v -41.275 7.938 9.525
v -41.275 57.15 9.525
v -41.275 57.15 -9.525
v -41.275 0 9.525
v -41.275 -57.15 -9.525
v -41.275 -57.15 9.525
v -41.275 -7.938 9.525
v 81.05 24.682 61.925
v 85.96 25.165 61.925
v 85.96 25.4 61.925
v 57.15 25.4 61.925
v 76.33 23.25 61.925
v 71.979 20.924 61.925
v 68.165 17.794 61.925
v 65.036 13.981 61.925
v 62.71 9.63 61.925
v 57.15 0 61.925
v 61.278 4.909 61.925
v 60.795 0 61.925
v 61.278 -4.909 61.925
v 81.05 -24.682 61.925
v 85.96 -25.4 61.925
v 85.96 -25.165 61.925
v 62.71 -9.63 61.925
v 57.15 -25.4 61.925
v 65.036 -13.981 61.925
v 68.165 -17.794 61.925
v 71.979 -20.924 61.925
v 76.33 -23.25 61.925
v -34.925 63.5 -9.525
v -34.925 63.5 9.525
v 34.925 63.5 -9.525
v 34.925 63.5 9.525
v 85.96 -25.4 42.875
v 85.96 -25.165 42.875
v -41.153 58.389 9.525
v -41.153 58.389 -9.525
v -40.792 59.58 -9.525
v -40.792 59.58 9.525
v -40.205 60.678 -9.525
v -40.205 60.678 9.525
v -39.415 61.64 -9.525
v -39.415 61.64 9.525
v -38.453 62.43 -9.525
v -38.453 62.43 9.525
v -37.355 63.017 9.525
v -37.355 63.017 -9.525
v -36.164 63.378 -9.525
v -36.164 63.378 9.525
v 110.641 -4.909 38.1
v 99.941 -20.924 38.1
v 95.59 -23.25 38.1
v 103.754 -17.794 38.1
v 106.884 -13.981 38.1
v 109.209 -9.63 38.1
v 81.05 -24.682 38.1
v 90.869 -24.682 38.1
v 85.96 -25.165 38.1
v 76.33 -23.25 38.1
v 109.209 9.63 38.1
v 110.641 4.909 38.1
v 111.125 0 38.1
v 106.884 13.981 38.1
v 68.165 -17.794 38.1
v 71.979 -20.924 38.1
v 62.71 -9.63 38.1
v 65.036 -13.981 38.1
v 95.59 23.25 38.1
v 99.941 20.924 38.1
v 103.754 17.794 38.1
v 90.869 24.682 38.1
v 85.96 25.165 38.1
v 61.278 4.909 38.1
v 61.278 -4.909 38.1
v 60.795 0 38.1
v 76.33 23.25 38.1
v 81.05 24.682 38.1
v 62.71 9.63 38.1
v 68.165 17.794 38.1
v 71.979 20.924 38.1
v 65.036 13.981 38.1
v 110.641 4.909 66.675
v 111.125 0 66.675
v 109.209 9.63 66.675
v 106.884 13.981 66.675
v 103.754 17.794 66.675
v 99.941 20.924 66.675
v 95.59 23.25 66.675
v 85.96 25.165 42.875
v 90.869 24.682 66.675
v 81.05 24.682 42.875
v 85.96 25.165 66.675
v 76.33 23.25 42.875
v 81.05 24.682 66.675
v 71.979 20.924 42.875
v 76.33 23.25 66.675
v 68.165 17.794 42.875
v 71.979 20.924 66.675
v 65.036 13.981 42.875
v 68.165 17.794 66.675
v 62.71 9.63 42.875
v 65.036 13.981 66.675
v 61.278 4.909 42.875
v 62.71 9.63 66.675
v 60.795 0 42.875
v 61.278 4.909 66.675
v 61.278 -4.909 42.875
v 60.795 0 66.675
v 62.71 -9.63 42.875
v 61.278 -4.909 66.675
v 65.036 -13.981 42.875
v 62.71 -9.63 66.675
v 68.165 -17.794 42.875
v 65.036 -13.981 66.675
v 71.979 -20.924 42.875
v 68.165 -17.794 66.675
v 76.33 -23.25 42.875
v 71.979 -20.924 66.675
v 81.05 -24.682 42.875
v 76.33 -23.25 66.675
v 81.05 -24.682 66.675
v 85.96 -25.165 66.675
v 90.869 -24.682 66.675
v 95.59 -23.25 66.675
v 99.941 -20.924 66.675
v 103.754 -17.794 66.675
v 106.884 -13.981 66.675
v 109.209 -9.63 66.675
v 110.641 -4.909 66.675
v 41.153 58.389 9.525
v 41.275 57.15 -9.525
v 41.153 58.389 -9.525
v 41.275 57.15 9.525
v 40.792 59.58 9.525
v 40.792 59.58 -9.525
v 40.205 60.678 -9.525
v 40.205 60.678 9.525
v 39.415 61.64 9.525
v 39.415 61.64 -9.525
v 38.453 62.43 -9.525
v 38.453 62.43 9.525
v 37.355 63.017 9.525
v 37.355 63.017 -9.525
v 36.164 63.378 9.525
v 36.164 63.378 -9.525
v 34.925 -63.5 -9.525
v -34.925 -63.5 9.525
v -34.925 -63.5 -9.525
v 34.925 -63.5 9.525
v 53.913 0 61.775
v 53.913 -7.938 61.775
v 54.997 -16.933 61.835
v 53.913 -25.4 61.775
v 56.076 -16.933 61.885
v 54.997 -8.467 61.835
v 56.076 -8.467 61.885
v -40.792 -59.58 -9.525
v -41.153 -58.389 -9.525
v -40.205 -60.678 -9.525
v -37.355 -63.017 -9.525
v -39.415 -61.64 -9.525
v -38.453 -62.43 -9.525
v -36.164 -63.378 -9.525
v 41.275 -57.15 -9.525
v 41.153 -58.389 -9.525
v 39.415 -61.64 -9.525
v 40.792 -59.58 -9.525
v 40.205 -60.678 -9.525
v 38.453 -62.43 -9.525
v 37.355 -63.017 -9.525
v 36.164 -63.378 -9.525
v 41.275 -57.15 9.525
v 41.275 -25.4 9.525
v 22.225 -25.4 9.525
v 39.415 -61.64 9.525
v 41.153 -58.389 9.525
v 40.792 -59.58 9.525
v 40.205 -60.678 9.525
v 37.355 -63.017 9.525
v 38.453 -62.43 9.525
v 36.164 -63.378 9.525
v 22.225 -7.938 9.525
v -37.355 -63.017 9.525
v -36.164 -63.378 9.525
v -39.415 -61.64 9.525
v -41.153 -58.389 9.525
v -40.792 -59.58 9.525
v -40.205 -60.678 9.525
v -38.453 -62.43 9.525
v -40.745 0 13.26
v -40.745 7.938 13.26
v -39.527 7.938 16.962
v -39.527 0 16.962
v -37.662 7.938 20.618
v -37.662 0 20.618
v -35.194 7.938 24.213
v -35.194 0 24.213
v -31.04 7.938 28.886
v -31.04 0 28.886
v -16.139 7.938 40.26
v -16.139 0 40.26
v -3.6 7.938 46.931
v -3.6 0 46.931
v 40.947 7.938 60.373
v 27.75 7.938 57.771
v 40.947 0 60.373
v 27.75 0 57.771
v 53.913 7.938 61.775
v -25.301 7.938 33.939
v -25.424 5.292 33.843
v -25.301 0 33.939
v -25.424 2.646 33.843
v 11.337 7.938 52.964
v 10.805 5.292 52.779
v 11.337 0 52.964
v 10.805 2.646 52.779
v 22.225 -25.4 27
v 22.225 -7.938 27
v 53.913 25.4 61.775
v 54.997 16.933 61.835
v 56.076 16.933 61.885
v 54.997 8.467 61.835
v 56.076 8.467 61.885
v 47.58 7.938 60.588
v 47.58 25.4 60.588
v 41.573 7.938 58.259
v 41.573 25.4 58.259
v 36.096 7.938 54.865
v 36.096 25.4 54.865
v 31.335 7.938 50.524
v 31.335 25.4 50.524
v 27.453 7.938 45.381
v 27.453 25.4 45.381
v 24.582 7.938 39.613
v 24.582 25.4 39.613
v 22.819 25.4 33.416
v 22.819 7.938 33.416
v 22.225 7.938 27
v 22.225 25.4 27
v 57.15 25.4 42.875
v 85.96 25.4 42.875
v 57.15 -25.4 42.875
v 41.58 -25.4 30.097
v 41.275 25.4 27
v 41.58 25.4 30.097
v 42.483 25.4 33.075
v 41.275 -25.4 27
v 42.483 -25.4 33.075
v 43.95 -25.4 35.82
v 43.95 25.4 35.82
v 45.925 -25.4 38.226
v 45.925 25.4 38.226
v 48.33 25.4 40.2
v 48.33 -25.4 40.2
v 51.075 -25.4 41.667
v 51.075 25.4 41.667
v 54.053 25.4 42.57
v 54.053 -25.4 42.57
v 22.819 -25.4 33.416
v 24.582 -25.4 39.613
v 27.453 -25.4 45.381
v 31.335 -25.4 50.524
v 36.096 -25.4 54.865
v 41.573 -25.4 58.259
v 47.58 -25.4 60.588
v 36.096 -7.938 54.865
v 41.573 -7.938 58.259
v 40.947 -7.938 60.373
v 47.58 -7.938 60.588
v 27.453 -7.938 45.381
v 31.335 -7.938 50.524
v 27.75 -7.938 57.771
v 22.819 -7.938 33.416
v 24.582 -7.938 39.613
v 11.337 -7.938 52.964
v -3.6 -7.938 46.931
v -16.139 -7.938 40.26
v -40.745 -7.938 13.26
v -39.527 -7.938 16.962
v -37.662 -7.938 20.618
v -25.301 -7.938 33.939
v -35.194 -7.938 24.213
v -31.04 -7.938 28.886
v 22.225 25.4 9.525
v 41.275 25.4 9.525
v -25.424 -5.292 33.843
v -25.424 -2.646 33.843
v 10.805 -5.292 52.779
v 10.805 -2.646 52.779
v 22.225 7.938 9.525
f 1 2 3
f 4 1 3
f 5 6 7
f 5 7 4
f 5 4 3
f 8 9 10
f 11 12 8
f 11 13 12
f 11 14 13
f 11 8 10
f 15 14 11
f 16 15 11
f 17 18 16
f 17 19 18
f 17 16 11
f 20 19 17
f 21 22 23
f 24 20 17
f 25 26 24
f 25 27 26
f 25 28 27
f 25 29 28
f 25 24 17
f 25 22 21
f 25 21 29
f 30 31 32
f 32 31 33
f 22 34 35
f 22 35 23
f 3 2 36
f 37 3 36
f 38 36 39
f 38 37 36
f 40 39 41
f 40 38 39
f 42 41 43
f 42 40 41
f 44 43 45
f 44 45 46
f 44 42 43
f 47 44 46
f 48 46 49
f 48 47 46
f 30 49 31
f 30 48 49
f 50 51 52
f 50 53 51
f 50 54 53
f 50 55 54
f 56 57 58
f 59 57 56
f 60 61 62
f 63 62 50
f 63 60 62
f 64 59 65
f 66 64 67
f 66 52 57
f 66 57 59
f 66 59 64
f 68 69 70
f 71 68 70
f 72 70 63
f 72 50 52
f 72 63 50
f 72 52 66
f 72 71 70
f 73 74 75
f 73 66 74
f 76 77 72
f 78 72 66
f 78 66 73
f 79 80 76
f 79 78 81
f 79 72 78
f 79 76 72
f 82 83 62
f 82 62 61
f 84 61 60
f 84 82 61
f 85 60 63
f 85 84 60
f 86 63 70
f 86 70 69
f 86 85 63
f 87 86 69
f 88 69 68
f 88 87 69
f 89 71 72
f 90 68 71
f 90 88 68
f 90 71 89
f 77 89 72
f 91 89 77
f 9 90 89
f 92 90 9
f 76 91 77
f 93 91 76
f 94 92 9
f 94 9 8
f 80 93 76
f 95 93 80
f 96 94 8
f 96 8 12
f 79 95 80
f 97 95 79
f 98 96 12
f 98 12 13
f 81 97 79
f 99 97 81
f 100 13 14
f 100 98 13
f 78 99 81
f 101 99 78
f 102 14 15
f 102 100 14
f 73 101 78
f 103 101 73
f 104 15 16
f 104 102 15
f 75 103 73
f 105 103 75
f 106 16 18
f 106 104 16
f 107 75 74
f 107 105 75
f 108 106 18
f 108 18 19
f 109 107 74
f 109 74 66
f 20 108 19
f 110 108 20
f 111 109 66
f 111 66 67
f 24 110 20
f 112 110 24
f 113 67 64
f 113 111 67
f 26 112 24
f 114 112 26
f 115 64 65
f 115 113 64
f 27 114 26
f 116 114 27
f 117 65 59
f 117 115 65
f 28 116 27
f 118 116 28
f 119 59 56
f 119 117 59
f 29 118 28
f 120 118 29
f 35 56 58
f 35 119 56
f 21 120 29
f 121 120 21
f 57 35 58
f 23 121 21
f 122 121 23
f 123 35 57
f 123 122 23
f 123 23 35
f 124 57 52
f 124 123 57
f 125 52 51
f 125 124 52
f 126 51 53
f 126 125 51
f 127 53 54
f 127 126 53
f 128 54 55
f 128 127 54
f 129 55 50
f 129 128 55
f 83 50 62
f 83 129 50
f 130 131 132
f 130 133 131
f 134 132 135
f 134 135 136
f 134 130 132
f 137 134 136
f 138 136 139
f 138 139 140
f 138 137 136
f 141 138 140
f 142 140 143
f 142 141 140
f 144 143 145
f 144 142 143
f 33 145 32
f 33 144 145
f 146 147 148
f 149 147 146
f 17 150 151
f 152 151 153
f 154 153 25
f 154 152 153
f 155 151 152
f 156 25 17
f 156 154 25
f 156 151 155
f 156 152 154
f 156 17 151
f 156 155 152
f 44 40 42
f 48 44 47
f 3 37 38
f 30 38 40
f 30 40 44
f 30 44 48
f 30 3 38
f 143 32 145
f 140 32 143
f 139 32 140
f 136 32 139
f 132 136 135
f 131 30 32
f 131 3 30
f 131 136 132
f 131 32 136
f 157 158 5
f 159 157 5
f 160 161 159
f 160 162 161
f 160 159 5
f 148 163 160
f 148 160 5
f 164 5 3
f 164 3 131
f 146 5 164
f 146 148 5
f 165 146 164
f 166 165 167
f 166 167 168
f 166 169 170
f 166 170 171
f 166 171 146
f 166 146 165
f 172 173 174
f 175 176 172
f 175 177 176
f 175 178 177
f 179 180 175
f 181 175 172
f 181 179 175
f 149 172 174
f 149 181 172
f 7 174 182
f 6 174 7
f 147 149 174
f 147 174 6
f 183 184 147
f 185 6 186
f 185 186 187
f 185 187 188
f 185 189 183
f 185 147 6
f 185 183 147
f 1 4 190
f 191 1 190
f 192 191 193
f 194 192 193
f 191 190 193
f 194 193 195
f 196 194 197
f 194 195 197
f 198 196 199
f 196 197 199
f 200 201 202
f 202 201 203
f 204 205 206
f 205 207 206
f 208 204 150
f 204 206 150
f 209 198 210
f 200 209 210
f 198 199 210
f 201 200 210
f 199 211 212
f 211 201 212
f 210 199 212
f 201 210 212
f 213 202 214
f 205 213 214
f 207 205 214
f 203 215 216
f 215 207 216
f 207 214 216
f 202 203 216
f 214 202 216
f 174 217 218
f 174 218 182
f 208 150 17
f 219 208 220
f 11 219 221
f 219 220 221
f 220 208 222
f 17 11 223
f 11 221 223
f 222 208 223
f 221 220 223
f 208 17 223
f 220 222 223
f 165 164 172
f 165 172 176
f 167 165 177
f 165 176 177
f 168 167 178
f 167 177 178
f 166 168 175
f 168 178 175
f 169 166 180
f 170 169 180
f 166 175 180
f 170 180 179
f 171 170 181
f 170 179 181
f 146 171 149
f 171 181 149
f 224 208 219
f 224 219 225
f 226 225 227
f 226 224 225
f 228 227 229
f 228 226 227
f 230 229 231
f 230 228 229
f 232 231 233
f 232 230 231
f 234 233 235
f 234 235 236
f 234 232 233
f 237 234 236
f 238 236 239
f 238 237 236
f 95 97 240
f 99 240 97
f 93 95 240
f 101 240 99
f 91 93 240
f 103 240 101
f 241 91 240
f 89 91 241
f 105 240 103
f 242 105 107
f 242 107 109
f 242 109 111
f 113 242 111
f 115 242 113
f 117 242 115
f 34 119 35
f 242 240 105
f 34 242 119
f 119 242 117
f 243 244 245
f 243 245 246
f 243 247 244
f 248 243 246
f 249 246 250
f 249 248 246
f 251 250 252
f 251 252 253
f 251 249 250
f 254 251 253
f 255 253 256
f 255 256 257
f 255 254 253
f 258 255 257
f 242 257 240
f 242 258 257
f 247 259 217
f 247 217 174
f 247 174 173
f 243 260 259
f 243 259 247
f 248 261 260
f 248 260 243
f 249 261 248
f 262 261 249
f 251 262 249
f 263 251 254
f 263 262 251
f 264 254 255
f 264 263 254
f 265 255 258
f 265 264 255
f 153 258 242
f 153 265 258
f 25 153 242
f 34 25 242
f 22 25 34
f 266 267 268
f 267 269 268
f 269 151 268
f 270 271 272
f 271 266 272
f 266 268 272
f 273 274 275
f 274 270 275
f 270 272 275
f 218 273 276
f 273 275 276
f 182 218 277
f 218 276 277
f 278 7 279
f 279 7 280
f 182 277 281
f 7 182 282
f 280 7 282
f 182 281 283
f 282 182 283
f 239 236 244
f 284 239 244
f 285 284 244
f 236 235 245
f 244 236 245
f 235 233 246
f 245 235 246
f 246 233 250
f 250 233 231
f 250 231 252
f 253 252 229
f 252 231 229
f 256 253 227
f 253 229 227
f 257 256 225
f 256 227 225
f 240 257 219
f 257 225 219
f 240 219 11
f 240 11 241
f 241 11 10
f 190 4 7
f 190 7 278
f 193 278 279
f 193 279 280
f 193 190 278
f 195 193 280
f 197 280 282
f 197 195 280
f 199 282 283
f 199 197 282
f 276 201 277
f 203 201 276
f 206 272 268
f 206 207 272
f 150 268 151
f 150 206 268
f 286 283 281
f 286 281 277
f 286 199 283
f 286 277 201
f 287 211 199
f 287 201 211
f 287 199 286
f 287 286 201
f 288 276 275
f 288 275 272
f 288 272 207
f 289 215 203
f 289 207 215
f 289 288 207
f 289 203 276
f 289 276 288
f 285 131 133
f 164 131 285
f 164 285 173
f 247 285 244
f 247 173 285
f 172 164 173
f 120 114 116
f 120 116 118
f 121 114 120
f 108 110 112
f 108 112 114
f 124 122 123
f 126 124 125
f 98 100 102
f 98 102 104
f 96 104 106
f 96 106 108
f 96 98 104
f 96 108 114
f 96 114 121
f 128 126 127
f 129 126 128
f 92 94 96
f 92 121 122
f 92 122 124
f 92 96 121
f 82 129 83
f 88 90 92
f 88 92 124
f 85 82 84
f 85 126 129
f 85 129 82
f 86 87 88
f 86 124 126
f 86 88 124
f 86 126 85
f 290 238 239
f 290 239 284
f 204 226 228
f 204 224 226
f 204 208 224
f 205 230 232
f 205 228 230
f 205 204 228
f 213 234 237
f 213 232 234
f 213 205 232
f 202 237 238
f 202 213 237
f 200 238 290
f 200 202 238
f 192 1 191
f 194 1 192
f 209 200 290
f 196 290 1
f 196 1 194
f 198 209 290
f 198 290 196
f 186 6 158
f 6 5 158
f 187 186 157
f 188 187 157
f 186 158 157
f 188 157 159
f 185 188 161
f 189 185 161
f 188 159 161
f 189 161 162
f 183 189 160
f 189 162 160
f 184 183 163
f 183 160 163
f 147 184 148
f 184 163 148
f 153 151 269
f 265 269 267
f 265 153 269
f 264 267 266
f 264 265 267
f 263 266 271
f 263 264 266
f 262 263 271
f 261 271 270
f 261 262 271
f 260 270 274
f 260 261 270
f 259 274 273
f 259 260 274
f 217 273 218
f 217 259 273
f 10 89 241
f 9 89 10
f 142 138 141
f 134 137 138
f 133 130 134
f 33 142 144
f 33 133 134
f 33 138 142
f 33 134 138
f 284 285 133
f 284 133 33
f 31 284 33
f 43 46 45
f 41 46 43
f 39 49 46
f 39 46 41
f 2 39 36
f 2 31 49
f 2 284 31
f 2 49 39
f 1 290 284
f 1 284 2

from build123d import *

# Parameters (mm, degrees)
F1_DEPTH = 63.5
F0_W     = 25.6348975327
F0_H     = 19.05
F2_DEPTH = 25.4
F3_DEPTH = 7.9375
F5_R     = 6.35


with BuildPart() as f1:
    # F0 (on Front) → F1 (new body, symmetric)
    with BuildSketch(Plane.XZ):
        Polygon((-41.275, 9.525), (-41.275, -9.525), (41.275, -9.525), (41.275, 9.525), (22.225, 9.525), align=None)
    extrude(amount=F1_DEPTH, both=True)

    # F0 (on Front) → F2 (join, symmetric)
    with BuildSketch(Plane.XZ):
        with Locations((73.1424487663, 52.4002)):
            Rectangle(F0_W, F0_H)
        with BuildLine():
            Line((22.225, 9.525), (41.275, 9.525))
            Line((41.275, 9.525), (41.275, 27.0002))
            ThreePointArc((41.275, 27.0002), (45.9246798487, 38.2255201513), (57.15, 42.8752))
            Line((57.15, 42.8752), (60.325, 42.8752))
            Line((60.325, 42.8752), (60.325, 61.9252))
            Line((60.325, 61.9252), (57.15, 61.9252))
            add(Edge.make_bspline(
                [(53.9130436504, 61.7748709343), (54.9990019691, 61.8396052695), (56.0783362522, 61.8898327624), (57.15, 61.9252)],
                knots=[108.6972179198, 108.6972179198, 108.6972179198, 108.6972179198, 111.5045361635, 111.5045361635, 111.5045361635, 111.5045361635], degree=3))
            ThreePointArc((53.9130436504, 61.7748709343), (31.3352142609, 50.5236449485), (22.225, 27.0002))
            Line((22.225, 27.0002), (22.225, 9.525))
        make_face()
    extrude(amount=F2_DEPTH, both=True)

    # F0 (on Front) → F3 (join, symmetric)
    with BuildSketch(Plane.XZ):
        with BuildLine():
            add(Edge.make_bspline(
                [(-41.275, 9.525), (-40.1125262679, 35.0135860213), (11.8655670999, 59.2684069252), (53.9130436504, 61.7748709343)],
                knots=[0, 0, 0, 0, 108.6972179198, 108.6972179198, 108.6972179198, 108.6972179198], degree=3))
            Line((-41.275, 9.525), (22.225, 9.525))
            Line((22.225, 9.525), (22.225, 27.0002))
            ThreePointArc((22.225, 27.0002), (31.3352142609, 50.5236449485), (53.9130436504, 61.7748709343))
        make_face()
    extrude(amount=F3_DEPTH, both=True)

    # F0 (on Front) → F4 (revolve)
    with BuildSketch(Plane.XZ):
        Polygon((85.9598975327, 66.675), (85.9598975327, 61.9252), (85.9598975327, 42.8752), (85.9598975327, 38.1), (111.125, 38.1), (111.125, 66.675), align=None)
    revolve(axis=Axis((85.9598975327, 0, 52.3875), (0, 0, 1)))

    # F5
    f5_edges = [f1.edges().sort_by_distance(p)[0] for p in [
        (41.275, -63.5, 0),
        (-41.275, -63.5, 0),
        (-41.275, 63.5, 0),
        (41.275, 63.5, 0),
    ]]
    fillet(f5_edges, radius=F5_R)


solid = f1.part
